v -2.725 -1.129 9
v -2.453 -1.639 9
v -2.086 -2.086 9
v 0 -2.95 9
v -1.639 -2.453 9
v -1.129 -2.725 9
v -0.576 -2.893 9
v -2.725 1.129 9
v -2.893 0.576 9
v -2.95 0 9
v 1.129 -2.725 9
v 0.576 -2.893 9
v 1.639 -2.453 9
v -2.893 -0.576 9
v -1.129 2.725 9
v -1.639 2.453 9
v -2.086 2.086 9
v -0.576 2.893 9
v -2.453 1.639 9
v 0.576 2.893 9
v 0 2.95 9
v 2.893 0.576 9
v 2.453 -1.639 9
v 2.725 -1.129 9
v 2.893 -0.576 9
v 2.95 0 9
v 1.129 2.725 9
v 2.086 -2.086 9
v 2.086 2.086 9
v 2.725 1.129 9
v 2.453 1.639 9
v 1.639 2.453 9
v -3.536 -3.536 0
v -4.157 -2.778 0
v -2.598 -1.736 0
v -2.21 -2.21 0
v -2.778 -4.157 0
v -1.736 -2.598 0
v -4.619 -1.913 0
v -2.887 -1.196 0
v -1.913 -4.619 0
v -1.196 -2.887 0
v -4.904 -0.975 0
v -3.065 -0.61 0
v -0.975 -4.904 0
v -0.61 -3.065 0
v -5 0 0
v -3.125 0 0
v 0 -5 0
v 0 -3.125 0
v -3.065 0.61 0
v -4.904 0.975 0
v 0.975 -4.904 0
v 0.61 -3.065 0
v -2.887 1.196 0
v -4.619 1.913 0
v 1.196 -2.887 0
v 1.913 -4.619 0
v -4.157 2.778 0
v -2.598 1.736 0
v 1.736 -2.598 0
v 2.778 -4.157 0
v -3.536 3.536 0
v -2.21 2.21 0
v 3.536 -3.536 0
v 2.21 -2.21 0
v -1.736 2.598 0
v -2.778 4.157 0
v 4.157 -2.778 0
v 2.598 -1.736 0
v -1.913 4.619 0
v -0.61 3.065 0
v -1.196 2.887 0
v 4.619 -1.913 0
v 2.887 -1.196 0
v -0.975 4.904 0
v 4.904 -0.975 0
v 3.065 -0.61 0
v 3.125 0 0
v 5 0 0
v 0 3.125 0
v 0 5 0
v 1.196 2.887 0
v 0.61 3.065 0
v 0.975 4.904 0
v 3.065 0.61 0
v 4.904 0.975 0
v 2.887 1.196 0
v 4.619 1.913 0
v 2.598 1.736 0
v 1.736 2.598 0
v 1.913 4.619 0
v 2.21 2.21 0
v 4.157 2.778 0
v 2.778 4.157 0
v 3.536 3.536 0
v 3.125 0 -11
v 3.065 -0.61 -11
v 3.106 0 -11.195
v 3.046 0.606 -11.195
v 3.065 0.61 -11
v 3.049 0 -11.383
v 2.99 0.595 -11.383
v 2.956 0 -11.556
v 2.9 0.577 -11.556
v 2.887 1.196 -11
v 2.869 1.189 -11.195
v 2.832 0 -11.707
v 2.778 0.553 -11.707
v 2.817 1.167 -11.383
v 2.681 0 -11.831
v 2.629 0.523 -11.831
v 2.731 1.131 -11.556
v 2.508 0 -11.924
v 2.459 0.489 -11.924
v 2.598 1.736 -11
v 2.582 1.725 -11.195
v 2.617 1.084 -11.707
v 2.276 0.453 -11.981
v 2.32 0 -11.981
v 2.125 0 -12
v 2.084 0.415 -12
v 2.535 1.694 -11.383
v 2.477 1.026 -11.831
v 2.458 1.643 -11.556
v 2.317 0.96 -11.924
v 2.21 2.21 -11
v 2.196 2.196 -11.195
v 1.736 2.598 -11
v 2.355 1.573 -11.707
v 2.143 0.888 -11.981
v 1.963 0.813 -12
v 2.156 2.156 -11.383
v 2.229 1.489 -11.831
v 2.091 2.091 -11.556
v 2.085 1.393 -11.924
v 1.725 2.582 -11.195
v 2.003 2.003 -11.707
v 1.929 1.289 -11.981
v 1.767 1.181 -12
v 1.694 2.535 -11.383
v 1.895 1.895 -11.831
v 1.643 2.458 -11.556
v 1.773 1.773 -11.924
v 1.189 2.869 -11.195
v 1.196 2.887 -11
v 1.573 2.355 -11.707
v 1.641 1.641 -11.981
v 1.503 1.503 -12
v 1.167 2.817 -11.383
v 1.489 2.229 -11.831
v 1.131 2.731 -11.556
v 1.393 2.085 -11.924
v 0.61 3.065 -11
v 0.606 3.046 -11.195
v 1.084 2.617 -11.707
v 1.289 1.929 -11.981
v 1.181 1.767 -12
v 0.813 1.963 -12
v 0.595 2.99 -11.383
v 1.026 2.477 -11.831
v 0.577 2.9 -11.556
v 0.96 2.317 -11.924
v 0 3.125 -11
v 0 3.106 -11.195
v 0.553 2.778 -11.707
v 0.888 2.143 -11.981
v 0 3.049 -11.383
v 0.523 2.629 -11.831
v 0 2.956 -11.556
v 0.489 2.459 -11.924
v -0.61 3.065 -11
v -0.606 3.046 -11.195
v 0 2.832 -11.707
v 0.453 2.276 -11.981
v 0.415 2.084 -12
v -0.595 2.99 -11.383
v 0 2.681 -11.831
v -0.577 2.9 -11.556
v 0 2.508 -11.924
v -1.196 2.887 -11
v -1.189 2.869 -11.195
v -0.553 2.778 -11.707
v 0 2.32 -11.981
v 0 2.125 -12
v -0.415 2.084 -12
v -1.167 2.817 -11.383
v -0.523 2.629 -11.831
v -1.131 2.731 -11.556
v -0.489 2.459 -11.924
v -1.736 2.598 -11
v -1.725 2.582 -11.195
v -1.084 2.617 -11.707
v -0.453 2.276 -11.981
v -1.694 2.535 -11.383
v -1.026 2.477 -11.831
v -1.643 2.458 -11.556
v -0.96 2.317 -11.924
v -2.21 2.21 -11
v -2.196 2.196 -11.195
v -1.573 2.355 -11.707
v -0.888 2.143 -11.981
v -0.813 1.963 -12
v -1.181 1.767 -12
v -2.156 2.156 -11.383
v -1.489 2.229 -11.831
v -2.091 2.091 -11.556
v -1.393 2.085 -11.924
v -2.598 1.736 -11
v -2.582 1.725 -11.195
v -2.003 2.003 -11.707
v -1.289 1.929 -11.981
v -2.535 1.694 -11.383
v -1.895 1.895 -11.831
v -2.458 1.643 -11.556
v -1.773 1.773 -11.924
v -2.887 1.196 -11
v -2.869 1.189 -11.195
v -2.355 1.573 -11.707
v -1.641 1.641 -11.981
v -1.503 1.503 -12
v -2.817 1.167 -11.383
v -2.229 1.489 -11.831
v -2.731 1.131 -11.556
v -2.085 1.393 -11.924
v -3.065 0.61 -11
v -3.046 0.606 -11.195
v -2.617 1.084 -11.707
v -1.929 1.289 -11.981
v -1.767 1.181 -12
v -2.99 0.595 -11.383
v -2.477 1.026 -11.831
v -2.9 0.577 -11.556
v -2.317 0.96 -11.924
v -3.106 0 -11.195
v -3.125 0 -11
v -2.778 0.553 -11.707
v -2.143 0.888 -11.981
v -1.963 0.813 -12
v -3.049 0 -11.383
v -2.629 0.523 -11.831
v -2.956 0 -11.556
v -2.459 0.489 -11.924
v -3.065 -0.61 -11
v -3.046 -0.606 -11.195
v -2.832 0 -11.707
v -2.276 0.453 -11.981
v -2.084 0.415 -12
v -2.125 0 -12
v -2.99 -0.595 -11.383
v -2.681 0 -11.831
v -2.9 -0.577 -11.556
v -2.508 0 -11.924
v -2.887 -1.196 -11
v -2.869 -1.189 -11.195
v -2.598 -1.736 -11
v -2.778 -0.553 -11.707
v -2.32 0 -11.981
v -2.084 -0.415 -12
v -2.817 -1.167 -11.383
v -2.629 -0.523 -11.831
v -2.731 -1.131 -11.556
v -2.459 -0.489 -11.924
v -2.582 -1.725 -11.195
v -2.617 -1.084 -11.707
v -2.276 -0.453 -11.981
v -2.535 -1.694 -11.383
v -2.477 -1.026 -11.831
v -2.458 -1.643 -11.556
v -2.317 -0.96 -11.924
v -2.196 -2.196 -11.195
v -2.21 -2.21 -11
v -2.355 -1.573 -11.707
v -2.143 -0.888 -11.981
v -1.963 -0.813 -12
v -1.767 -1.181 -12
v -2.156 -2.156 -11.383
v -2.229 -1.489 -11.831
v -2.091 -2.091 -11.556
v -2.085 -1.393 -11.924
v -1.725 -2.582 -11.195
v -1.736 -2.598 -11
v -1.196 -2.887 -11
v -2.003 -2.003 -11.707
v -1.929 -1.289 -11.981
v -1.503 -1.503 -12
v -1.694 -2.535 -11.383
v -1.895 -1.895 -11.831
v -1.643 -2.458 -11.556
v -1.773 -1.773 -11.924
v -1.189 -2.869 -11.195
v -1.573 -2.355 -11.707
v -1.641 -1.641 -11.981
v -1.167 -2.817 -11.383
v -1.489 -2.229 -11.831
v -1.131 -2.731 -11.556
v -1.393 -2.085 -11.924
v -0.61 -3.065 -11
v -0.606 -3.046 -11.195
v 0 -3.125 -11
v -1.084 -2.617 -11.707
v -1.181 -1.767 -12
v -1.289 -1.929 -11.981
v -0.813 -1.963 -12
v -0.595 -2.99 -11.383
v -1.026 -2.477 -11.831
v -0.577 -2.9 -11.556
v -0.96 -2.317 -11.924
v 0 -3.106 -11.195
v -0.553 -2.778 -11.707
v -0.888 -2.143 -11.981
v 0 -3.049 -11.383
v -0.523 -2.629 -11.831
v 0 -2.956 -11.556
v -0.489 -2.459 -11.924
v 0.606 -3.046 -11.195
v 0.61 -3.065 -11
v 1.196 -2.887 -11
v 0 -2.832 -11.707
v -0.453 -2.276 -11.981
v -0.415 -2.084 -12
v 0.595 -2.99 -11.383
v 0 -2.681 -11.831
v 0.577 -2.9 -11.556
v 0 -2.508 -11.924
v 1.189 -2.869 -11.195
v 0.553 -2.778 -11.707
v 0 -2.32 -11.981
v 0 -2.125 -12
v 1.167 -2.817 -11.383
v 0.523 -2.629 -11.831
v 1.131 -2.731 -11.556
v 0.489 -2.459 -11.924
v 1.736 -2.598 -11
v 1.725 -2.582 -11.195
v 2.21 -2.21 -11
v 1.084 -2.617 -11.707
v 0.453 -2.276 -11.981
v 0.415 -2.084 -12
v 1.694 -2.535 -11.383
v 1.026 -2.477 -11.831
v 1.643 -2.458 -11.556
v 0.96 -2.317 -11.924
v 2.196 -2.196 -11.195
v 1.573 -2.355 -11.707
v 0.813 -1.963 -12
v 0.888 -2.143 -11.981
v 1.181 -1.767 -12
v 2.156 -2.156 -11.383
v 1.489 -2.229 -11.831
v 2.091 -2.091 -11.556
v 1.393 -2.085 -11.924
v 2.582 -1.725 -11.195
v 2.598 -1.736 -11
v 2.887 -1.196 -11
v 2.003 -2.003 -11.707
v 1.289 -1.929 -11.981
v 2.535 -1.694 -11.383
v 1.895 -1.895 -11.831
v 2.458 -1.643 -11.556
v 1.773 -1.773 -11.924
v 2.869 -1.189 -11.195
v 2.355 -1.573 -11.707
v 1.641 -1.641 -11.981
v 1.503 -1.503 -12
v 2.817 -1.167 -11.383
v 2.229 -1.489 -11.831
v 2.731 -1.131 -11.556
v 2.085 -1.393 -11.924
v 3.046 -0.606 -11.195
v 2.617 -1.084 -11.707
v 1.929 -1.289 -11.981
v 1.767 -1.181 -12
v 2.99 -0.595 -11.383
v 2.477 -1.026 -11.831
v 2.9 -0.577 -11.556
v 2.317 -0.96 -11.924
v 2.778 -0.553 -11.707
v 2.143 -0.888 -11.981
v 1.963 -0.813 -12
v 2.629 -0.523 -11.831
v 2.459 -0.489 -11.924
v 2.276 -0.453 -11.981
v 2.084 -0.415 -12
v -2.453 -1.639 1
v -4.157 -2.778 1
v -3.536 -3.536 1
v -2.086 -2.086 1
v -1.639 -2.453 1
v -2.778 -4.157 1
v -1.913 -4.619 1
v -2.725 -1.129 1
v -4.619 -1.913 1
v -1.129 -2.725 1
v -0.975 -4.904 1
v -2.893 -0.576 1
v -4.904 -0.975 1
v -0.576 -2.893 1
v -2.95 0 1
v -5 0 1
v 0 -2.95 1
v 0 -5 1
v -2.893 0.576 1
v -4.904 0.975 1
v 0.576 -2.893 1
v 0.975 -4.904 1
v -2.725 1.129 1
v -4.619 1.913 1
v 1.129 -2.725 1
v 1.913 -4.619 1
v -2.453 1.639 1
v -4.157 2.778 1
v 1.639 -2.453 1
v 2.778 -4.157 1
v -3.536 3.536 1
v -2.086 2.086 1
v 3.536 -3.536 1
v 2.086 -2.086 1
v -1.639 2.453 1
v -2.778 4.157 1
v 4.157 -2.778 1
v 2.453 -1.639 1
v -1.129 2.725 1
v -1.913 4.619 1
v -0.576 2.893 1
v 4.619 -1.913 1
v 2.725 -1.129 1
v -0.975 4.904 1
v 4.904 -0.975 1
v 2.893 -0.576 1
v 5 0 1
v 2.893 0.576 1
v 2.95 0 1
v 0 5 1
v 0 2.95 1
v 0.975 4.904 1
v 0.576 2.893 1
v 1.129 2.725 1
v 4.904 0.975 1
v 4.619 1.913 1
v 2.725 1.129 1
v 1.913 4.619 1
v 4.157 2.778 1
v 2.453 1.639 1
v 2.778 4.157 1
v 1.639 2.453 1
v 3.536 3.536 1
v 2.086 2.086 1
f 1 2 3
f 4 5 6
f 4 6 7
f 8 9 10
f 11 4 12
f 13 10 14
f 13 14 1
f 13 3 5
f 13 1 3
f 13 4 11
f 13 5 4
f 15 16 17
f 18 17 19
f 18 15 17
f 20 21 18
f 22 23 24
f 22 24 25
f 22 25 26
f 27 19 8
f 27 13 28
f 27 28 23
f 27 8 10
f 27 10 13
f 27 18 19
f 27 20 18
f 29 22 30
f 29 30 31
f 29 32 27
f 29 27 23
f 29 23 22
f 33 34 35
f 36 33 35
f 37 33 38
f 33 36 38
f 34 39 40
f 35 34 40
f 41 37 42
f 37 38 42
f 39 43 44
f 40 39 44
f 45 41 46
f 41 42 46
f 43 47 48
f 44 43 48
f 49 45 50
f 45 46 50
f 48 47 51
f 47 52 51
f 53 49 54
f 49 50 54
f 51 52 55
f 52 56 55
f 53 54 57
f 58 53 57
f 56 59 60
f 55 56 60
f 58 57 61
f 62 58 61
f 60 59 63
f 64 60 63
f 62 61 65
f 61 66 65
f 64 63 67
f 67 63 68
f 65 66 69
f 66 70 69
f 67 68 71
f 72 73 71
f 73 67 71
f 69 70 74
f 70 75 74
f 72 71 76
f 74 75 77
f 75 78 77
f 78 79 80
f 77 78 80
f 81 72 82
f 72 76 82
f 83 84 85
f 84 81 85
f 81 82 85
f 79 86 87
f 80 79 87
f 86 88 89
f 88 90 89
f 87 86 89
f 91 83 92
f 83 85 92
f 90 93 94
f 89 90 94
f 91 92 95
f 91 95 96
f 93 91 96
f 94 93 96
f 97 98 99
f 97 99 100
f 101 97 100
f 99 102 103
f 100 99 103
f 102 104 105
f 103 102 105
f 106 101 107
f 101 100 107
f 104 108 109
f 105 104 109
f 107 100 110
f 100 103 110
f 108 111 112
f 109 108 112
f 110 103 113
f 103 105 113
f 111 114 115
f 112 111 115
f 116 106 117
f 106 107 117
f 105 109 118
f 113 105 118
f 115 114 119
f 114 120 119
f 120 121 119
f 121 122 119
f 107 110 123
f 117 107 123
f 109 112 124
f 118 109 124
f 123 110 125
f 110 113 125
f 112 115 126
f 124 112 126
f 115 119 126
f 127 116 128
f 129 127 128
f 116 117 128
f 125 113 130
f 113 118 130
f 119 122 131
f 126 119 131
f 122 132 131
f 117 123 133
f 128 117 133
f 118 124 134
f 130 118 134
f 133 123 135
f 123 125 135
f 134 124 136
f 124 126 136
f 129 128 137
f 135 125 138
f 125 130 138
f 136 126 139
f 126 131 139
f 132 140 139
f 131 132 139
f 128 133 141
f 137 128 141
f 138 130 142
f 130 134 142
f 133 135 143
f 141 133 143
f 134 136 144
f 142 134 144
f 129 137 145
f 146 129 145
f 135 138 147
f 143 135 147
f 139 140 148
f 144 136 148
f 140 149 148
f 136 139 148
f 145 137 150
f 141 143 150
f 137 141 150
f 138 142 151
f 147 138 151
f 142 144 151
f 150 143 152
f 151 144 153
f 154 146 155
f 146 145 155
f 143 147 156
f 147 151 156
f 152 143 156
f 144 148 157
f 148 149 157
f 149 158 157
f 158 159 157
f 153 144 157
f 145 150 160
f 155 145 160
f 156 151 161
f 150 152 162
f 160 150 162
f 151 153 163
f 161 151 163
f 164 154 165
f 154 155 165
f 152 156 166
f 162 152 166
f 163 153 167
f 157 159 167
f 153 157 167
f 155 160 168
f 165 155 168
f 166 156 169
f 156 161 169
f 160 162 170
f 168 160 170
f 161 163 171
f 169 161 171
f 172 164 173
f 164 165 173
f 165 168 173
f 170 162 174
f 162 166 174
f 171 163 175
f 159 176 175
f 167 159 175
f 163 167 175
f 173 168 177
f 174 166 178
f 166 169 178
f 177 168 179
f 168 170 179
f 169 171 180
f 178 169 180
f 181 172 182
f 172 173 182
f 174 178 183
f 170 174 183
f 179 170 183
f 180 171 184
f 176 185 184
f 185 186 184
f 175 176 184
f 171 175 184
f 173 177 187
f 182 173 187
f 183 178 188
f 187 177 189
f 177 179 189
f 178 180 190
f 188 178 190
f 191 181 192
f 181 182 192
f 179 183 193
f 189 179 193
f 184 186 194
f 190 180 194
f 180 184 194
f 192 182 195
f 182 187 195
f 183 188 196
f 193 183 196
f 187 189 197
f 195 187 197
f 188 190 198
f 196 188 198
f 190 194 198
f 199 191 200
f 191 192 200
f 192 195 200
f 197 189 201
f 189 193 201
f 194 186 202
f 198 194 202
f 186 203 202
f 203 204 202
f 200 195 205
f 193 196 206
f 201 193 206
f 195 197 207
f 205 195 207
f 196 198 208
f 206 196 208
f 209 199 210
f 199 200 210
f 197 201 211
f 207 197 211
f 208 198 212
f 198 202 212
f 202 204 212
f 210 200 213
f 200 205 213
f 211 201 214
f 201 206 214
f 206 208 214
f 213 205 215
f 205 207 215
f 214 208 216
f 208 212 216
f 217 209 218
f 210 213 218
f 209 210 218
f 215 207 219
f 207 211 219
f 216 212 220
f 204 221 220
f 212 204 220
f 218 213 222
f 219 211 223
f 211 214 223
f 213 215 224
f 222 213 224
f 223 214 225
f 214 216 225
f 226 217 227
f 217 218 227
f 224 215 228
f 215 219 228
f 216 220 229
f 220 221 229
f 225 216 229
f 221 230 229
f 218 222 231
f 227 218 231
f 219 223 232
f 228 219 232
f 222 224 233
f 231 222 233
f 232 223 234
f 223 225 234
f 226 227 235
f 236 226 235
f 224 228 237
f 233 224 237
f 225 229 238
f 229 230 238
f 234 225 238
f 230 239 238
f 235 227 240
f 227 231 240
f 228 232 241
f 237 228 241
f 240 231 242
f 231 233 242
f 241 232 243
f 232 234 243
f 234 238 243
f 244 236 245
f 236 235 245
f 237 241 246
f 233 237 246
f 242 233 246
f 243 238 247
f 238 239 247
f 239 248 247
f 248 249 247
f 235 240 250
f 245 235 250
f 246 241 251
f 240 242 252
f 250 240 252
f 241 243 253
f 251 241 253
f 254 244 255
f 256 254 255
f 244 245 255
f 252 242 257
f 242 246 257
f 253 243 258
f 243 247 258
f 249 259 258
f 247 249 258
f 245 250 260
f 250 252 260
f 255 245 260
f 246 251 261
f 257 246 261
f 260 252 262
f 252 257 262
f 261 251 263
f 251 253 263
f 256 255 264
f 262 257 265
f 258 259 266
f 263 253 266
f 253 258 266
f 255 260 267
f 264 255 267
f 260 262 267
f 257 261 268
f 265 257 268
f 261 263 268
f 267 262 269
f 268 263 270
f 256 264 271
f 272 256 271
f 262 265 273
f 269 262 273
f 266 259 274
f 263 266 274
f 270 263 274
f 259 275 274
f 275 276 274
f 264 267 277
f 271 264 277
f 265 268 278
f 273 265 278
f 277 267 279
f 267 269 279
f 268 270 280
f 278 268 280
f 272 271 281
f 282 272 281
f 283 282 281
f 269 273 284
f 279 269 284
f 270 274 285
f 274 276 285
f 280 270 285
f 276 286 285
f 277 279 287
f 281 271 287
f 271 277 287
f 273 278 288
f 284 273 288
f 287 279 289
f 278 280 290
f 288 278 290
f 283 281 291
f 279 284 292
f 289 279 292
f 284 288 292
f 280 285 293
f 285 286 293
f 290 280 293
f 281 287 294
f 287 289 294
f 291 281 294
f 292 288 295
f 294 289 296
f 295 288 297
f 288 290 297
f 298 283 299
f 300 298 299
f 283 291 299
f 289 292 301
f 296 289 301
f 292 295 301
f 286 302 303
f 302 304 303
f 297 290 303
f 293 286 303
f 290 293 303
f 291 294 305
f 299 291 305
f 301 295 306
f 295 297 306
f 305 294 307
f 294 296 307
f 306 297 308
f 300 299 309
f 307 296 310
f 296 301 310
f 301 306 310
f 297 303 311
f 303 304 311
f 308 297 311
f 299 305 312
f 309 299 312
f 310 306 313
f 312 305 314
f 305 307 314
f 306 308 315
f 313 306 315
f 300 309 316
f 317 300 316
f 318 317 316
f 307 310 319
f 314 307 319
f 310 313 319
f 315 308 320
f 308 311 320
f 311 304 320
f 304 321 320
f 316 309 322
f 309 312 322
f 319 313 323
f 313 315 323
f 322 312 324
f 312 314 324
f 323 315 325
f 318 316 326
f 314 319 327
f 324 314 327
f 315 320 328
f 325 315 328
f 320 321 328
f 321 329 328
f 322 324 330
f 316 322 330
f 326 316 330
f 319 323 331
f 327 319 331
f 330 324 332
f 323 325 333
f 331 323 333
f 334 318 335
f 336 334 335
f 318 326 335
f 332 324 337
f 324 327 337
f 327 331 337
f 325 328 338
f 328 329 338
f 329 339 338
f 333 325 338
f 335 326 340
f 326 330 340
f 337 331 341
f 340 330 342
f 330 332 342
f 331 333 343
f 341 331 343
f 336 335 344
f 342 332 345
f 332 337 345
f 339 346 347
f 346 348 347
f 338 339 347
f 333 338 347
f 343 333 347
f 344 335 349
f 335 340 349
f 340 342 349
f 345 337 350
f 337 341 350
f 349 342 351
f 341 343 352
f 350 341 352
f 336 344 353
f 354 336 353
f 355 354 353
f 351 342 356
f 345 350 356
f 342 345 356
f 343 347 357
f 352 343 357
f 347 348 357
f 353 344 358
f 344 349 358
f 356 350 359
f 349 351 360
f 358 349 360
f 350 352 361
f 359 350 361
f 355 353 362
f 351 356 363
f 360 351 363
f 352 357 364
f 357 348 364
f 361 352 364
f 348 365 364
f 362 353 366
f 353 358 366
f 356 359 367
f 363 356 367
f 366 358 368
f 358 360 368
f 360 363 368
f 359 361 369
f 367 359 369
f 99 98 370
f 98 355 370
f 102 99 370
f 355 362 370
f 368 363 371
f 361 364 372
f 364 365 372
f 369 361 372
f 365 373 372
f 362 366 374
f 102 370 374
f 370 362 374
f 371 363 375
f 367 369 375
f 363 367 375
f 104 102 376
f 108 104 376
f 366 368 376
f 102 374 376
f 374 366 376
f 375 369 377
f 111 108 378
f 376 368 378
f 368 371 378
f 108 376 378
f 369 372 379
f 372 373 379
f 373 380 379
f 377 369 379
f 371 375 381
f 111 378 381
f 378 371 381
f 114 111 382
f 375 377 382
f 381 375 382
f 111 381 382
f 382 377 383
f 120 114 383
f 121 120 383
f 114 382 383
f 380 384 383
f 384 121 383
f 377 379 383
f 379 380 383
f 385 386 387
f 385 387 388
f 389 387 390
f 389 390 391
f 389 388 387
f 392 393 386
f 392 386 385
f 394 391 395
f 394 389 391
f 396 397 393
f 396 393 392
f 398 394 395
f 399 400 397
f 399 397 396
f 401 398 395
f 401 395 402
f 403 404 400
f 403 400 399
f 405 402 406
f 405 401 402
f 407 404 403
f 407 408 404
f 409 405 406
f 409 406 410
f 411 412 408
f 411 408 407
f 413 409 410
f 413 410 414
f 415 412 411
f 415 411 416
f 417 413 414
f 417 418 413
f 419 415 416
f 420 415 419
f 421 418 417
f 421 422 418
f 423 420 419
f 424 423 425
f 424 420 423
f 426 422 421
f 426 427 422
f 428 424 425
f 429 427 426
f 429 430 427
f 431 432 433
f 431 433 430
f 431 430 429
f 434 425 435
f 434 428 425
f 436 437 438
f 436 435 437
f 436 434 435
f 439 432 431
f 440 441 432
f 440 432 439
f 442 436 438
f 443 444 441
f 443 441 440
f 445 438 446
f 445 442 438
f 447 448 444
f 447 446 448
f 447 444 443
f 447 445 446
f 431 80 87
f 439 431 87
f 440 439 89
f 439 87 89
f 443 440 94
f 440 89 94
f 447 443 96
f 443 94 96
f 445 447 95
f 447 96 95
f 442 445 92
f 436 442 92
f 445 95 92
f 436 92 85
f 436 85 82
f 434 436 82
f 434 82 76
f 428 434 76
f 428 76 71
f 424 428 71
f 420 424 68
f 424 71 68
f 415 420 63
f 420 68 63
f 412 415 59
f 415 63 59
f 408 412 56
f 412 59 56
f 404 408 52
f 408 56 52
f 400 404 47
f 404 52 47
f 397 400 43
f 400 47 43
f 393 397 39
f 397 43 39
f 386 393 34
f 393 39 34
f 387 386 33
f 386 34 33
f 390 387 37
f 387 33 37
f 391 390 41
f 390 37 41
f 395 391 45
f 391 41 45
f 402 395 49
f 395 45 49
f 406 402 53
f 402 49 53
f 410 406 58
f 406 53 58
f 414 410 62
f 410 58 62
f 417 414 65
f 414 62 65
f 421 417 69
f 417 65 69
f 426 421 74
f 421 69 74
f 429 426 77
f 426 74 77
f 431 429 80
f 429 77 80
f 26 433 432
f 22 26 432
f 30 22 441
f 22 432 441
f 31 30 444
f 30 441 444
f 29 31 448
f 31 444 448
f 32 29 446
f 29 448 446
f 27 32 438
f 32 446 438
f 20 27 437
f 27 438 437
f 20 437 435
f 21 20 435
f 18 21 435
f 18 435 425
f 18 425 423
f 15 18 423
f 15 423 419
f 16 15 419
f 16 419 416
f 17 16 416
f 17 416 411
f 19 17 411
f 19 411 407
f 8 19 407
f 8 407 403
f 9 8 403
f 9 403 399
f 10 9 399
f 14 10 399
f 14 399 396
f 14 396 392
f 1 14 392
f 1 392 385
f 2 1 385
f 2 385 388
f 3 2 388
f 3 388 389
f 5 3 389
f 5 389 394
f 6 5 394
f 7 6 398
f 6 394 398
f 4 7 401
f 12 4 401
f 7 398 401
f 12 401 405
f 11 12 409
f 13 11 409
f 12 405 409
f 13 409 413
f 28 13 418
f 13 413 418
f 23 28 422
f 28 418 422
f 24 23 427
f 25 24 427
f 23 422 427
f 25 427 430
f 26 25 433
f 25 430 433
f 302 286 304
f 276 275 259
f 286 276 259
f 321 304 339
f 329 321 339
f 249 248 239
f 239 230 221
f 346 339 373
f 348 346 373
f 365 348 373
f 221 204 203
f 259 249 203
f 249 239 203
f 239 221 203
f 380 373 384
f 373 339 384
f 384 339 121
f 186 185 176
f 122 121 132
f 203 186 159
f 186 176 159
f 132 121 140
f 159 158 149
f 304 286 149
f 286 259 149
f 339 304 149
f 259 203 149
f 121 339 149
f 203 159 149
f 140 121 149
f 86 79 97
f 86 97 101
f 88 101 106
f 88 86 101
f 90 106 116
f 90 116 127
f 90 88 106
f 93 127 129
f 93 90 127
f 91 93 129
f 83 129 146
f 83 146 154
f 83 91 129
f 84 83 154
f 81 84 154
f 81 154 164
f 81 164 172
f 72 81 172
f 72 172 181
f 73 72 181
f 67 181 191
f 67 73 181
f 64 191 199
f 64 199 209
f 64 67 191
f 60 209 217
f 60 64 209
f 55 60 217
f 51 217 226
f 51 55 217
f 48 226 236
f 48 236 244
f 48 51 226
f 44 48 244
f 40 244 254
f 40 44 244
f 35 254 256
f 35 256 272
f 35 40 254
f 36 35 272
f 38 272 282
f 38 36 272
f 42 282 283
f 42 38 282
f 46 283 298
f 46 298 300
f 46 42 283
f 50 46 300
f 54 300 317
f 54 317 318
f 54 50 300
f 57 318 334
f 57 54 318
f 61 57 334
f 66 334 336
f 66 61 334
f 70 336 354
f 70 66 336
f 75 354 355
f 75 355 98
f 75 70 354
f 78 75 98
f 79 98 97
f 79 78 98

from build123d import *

# Parameters (mm, degrees)
F0_R     = 2.95
F1_DEPTH = 9
F0_R_2   = 5
F0_R_3   = 3.125
F2_DEPTH = 1
F3_DEPTH = 12
F4_R     = 1


with BuildPart() as f1:
    # F0 (on Top) → F1 (new body)
    with BuildSketch(Plane.XY):
        Circle(F0_R)
    extrude(amount=F1_DEPTH)

    # F0 (on Top) → F2 (join)
    with BuildSketch(Plane.XY):
        Circle(F0_R_2)
        Circle(F0_R_3, mode=Mode.SUBTRACT)
        Circle(F0_R_3)
        Circle(F0_R, mode=Mode.SUBTRACT)
    extrude(amount=F2_DEPTH)

    # F0 (on Top) → F3 (join)
    with BuildSketch(Plane.XY):
        Circle(F0_R_3)
        Circle(F0_R, mode=Mode.SUBTRACT)
        Circle(F0_R)
    extrude(amount=-F3_DEPTH)

    # F4
    f4_edges = [f1.edges().sort_by_distance(p)[0] for p in [
        (-3.125, 0, -12),
    ]]
    fillet(f4_edges, radius=F4_R)


solid = f1.part
